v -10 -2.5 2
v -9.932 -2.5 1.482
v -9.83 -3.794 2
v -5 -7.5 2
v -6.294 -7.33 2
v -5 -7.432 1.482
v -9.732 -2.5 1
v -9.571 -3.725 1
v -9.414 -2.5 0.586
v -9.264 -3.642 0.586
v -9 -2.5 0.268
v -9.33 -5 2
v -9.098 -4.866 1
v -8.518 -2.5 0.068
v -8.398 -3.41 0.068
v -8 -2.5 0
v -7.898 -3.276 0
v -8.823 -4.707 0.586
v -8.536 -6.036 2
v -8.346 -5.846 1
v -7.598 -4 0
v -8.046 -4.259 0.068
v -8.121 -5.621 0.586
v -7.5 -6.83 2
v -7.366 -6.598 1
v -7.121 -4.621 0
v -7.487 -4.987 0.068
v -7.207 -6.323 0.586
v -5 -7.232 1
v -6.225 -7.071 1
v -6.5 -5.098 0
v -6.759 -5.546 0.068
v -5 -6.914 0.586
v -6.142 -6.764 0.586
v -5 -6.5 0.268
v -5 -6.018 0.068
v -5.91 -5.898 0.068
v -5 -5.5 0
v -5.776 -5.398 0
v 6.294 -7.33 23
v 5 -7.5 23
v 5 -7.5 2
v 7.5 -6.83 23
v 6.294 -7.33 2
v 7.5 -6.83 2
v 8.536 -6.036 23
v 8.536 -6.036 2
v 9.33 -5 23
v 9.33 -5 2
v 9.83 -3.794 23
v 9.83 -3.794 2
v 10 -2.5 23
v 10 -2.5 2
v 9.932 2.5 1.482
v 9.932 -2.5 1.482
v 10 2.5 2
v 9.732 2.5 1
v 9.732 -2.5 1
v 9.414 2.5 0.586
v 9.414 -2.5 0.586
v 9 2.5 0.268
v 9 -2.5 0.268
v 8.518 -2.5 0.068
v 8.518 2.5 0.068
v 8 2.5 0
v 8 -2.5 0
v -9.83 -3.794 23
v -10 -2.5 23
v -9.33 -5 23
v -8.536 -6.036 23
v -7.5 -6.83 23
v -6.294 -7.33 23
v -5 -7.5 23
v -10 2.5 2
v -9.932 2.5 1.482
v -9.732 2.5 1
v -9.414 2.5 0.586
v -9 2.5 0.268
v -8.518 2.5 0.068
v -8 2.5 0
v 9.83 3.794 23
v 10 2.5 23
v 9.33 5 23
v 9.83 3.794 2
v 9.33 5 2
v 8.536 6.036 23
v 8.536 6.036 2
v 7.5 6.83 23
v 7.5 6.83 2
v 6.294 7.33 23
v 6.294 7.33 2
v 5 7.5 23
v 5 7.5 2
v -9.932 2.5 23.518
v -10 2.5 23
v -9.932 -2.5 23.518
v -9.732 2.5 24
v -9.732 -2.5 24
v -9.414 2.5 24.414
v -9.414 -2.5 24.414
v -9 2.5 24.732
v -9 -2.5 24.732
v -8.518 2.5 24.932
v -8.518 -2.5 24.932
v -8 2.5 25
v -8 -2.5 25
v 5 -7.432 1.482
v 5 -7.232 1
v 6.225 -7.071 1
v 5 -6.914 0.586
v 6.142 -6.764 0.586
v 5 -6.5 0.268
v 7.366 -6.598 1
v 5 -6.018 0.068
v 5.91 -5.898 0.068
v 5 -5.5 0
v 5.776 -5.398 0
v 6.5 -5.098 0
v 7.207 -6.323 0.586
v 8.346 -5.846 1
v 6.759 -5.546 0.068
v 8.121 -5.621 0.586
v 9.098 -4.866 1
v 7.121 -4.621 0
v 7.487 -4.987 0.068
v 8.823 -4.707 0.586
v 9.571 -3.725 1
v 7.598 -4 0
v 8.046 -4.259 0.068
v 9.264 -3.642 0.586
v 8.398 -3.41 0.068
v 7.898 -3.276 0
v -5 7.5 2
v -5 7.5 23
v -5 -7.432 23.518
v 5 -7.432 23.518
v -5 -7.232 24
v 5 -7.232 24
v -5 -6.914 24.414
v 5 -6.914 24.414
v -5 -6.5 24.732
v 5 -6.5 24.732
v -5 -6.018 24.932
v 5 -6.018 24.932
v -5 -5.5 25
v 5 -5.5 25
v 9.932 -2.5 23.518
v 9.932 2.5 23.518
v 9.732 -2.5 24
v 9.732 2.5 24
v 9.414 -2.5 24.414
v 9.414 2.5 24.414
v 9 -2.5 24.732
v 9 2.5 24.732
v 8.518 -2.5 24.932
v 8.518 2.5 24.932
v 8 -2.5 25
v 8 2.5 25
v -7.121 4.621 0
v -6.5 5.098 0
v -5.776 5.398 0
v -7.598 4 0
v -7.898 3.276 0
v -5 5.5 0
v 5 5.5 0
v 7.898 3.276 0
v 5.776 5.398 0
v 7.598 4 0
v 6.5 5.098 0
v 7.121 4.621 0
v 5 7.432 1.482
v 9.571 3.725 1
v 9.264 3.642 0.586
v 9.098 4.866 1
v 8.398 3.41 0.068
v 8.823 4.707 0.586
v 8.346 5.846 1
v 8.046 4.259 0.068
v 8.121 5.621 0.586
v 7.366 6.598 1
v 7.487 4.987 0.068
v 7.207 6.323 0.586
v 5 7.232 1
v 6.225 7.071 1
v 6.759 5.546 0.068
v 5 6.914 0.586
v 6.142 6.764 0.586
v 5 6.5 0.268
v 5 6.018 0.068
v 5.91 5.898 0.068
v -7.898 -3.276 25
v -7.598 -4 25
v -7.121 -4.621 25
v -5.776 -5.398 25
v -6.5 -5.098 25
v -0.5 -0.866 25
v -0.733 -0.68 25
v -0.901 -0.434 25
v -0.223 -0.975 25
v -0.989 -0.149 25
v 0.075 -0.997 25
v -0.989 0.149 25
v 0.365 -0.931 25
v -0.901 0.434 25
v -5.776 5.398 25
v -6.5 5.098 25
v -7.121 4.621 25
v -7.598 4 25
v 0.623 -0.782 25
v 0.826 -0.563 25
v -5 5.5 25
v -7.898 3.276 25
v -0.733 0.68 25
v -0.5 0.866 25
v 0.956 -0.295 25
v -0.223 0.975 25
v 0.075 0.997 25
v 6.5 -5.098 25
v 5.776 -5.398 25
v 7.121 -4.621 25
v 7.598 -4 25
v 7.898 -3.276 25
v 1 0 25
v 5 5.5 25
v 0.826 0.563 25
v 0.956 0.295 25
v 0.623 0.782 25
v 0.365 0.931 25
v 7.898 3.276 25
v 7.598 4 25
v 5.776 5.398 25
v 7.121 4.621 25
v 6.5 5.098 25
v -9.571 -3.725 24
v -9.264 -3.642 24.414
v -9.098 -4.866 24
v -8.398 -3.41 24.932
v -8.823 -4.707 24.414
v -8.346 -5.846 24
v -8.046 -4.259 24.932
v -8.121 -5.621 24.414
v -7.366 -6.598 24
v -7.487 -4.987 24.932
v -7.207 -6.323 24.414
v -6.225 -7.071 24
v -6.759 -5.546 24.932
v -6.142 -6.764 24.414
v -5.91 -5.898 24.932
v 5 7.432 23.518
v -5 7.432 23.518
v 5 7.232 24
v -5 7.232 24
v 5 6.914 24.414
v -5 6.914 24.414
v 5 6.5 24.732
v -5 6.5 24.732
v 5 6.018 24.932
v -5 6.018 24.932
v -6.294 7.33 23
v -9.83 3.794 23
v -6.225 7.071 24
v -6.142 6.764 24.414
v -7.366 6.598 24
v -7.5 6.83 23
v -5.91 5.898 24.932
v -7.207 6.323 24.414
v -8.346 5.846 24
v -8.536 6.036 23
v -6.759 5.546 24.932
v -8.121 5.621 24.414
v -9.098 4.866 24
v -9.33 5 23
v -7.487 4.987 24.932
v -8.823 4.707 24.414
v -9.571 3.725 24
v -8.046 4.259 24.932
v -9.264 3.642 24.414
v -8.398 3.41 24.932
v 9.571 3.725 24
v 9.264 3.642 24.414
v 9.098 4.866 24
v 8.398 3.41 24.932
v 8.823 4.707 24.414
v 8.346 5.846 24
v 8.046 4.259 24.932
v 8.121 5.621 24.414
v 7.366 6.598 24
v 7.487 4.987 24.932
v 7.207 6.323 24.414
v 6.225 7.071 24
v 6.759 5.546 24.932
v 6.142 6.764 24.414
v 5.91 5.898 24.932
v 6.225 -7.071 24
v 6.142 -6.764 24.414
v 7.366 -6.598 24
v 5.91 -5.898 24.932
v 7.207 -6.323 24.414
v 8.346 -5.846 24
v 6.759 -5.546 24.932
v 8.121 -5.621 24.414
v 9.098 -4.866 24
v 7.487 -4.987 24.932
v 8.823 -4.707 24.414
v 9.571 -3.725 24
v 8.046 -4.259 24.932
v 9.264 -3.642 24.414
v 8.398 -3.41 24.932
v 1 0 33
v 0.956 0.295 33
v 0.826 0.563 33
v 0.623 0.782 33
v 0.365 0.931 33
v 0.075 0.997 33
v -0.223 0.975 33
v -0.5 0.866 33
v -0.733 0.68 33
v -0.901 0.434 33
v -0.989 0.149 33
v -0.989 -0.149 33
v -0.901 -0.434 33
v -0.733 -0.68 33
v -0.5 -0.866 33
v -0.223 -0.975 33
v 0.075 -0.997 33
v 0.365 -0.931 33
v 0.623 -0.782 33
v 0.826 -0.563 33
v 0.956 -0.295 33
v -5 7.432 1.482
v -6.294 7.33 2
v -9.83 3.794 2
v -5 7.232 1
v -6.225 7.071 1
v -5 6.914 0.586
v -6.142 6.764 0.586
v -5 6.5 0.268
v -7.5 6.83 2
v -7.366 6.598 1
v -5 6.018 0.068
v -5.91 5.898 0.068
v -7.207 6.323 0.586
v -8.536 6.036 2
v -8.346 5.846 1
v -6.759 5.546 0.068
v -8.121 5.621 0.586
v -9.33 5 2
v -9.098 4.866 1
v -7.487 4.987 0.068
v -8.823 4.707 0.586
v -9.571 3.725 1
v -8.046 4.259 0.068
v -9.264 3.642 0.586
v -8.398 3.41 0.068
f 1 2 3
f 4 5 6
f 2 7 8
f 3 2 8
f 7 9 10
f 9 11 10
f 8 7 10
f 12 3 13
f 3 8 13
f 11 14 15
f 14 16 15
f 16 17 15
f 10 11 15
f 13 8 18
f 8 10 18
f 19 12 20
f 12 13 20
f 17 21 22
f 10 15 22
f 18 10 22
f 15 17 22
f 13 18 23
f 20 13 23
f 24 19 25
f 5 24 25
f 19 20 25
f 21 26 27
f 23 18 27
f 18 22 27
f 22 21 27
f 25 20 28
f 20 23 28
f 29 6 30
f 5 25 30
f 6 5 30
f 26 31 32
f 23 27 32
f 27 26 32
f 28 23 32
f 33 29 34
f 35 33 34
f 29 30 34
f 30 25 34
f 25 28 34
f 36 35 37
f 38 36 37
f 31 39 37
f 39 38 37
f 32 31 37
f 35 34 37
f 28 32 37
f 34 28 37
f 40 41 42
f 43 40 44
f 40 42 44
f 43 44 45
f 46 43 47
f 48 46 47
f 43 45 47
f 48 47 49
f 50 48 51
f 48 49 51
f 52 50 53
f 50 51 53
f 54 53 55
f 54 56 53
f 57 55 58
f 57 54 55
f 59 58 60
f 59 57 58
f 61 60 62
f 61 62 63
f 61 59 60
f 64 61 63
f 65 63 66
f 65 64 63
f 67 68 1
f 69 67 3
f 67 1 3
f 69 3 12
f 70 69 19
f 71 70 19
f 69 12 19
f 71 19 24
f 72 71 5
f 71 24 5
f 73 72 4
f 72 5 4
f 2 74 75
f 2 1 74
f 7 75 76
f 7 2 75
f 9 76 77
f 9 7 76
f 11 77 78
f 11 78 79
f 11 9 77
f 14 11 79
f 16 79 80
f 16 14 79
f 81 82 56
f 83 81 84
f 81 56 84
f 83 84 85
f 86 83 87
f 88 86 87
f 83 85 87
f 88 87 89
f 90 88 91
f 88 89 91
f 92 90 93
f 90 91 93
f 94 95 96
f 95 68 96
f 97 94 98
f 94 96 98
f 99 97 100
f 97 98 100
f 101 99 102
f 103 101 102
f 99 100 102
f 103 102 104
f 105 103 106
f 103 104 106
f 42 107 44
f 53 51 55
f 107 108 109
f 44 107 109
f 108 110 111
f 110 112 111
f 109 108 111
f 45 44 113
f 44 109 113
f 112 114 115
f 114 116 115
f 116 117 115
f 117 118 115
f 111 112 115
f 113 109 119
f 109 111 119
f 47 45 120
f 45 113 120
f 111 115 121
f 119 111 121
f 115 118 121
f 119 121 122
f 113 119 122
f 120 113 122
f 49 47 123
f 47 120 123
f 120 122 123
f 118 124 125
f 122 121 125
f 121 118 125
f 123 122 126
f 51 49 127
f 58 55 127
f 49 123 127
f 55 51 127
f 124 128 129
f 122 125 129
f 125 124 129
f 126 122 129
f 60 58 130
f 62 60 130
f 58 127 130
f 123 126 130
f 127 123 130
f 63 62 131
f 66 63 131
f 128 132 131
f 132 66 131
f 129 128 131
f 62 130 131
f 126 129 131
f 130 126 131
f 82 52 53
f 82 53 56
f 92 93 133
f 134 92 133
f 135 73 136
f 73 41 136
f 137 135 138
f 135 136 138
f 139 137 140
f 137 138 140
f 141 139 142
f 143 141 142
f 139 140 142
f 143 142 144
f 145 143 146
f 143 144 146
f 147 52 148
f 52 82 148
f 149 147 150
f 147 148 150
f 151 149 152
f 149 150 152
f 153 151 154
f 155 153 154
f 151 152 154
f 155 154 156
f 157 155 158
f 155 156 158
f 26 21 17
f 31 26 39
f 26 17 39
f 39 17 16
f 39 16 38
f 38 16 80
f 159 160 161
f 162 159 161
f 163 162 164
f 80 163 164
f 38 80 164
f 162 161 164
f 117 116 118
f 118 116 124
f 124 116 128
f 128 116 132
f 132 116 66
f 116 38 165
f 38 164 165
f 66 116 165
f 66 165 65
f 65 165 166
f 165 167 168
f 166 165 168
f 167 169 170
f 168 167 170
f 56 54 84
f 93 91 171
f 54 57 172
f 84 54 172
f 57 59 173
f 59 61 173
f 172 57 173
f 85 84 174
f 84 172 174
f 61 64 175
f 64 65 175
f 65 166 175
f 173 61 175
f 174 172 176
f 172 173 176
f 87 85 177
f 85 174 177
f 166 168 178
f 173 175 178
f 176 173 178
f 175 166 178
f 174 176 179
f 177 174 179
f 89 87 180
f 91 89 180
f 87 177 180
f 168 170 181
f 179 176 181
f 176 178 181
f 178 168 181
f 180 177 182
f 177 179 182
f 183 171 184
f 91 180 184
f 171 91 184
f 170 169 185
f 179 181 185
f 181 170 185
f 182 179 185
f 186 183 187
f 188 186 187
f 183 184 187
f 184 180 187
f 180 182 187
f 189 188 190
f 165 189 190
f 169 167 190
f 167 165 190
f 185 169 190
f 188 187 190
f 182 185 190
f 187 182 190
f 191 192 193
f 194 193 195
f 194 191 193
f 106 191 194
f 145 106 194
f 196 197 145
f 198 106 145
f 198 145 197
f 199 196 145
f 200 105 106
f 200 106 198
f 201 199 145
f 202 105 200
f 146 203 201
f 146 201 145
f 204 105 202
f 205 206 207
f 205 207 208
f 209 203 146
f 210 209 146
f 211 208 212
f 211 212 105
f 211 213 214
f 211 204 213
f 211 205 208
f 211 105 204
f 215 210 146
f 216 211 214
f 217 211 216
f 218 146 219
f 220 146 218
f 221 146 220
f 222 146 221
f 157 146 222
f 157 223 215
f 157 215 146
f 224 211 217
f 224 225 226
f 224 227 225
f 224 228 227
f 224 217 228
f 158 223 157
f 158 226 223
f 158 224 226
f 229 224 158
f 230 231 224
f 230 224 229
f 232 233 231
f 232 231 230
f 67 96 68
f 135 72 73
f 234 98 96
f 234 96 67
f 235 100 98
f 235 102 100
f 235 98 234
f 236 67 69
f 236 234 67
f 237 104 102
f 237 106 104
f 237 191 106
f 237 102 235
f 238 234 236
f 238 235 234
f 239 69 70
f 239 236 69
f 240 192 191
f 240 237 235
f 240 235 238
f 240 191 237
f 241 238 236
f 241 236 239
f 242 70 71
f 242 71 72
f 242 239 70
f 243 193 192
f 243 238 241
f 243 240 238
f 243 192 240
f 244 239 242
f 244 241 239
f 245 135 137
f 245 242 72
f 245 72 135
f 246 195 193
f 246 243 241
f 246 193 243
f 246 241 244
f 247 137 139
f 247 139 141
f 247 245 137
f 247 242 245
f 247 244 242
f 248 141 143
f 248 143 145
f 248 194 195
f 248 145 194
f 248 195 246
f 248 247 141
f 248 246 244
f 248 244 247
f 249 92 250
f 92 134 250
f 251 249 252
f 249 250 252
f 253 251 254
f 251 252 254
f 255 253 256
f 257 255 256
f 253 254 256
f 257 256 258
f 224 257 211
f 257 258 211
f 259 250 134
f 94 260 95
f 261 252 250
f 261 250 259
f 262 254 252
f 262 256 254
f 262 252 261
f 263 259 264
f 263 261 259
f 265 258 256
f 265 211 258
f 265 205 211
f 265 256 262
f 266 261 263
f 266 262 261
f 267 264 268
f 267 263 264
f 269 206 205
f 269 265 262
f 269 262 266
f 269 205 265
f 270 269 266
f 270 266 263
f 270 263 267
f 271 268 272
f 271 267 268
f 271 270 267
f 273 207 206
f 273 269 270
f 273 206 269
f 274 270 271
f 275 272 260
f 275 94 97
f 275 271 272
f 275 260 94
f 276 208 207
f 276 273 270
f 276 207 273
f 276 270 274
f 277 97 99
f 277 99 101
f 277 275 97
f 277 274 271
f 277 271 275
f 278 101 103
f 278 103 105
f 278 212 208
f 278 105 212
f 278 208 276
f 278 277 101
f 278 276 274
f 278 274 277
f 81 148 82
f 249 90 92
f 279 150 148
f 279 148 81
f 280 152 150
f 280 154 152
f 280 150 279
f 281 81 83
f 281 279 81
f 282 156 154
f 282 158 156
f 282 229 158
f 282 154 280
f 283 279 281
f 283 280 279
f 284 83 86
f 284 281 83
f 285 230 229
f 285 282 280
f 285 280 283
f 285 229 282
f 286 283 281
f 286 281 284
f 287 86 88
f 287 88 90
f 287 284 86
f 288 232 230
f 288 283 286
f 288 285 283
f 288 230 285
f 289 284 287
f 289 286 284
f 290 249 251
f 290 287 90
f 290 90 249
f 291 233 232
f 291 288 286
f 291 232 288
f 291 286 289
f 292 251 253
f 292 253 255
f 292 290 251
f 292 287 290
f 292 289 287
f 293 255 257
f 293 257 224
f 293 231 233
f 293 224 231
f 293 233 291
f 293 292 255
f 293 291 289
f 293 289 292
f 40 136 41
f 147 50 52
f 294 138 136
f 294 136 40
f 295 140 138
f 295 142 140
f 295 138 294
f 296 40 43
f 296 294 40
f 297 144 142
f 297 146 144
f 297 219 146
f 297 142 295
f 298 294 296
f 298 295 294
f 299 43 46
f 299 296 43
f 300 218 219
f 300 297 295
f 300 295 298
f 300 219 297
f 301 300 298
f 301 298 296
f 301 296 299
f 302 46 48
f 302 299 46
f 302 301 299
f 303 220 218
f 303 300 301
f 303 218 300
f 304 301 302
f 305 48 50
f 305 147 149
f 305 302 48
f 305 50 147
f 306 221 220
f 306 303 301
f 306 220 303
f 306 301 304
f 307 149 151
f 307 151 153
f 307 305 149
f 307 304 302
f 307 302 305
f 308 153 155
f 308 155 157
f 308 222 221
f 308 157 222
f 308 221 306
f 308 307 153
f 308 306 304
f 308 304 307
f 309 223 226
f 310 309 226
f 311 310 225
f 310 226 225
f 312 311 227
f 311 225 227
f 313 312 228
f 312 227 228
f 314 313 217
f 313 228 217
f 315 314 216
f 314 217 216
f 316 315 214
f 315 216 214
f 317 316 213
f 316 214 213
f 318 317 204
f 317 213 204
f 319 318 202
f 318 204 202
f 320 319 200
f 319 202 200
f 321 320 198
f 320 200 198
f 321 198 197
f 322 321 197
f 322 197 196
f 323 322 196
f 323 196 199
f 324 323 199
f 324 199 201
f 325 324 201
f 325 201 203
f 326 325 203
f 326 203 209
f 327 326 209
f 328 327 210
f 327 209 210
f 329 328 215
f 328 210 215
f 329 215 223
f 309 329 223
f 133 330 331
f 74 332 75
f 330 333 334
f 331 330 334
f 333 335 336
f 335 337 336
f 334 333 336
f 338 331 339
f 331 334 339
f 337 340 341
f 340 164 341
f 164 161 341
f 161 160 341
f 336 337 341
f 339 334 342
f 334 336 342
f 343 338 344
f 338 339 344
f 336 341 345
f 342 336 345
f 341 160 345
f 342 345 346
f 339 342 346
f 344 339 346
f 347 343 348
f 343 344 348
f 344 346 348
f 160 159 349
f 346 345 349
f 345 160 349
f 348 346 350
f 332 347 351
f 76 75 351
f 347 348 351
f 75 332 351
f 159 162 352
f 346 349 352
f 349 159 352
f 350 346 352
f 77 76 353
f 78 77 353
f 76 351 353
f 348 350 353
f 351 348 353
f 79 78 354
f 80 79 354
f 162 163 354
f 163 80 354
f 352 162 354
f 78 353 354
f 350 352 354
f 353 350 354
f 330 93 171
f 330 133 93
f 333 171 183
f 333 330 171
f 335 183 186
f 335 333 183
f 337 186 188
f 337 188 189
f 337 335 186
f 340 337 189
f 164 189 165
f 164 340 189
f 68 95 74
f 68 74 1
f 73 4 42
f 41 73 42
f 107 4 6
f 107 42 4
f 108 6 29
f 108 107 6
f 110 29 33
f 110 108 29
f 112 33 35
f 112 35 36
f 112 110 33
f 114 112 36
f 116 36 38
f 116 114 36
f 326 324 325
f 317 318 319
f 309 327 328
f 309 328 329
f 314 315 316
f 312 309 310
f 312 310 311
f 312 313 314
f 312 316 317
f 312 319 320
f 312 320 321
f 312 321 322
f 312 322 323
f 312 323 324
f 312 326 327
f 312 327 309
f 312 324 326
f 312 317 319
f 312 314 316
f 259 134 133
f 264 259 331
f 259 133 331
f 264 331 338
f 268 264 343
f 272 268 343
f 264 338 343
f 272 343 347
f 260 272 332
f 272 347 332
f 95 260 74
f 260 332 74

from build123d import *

# Parameters (mm, degrees)
F1_DEPTH = 25
F2_R     = 2
F3_R     = 1
F4_DEPTH = 8


with BuildPart() as f1:
    # F0 (on Top) → F1 (new body)
    with BuildSketch(Plane.XY):
        with BuildLine():
            ThreePointArc((10, 2.5), (8.535534, 6.035534), (5, 7.5))
            Line((5, 7.5), (-5, 7.5))
            ThreePointArc((-5, 7.5), (-8.535534, 6.035534), (-10, 2.5))
            Line((-10, 2.5), (-10, -2.5))
            ThreePointArc((-10, -2.5), (-8.535534, -6.035534), (-5, -7.5))
            Line((-5, -7.5), (5, -7.5))
            ThreePointArc((5, -7.5), (8.535534, -6.035534), (10, -2.5))
            Line((10, -2.5), (10, 2.5))
        make_face()
    extrude(amount=F1_DEPTH)

    # F2
    f2_edges = [f1.edges().sort_by_distance(p)[0] for p in [
        (0, 7.5, 25),
        (0, 7.5, 0),
    ]]
    fillet(f2_edges, radius=F2_R)

    # F3 (on face) → F4 (join)
    with BuildSketch(Plane.XY.offset(25)):
        Circle(F3_R)
    extrude(amount=F4_DEPTH)


solid = f1.part
